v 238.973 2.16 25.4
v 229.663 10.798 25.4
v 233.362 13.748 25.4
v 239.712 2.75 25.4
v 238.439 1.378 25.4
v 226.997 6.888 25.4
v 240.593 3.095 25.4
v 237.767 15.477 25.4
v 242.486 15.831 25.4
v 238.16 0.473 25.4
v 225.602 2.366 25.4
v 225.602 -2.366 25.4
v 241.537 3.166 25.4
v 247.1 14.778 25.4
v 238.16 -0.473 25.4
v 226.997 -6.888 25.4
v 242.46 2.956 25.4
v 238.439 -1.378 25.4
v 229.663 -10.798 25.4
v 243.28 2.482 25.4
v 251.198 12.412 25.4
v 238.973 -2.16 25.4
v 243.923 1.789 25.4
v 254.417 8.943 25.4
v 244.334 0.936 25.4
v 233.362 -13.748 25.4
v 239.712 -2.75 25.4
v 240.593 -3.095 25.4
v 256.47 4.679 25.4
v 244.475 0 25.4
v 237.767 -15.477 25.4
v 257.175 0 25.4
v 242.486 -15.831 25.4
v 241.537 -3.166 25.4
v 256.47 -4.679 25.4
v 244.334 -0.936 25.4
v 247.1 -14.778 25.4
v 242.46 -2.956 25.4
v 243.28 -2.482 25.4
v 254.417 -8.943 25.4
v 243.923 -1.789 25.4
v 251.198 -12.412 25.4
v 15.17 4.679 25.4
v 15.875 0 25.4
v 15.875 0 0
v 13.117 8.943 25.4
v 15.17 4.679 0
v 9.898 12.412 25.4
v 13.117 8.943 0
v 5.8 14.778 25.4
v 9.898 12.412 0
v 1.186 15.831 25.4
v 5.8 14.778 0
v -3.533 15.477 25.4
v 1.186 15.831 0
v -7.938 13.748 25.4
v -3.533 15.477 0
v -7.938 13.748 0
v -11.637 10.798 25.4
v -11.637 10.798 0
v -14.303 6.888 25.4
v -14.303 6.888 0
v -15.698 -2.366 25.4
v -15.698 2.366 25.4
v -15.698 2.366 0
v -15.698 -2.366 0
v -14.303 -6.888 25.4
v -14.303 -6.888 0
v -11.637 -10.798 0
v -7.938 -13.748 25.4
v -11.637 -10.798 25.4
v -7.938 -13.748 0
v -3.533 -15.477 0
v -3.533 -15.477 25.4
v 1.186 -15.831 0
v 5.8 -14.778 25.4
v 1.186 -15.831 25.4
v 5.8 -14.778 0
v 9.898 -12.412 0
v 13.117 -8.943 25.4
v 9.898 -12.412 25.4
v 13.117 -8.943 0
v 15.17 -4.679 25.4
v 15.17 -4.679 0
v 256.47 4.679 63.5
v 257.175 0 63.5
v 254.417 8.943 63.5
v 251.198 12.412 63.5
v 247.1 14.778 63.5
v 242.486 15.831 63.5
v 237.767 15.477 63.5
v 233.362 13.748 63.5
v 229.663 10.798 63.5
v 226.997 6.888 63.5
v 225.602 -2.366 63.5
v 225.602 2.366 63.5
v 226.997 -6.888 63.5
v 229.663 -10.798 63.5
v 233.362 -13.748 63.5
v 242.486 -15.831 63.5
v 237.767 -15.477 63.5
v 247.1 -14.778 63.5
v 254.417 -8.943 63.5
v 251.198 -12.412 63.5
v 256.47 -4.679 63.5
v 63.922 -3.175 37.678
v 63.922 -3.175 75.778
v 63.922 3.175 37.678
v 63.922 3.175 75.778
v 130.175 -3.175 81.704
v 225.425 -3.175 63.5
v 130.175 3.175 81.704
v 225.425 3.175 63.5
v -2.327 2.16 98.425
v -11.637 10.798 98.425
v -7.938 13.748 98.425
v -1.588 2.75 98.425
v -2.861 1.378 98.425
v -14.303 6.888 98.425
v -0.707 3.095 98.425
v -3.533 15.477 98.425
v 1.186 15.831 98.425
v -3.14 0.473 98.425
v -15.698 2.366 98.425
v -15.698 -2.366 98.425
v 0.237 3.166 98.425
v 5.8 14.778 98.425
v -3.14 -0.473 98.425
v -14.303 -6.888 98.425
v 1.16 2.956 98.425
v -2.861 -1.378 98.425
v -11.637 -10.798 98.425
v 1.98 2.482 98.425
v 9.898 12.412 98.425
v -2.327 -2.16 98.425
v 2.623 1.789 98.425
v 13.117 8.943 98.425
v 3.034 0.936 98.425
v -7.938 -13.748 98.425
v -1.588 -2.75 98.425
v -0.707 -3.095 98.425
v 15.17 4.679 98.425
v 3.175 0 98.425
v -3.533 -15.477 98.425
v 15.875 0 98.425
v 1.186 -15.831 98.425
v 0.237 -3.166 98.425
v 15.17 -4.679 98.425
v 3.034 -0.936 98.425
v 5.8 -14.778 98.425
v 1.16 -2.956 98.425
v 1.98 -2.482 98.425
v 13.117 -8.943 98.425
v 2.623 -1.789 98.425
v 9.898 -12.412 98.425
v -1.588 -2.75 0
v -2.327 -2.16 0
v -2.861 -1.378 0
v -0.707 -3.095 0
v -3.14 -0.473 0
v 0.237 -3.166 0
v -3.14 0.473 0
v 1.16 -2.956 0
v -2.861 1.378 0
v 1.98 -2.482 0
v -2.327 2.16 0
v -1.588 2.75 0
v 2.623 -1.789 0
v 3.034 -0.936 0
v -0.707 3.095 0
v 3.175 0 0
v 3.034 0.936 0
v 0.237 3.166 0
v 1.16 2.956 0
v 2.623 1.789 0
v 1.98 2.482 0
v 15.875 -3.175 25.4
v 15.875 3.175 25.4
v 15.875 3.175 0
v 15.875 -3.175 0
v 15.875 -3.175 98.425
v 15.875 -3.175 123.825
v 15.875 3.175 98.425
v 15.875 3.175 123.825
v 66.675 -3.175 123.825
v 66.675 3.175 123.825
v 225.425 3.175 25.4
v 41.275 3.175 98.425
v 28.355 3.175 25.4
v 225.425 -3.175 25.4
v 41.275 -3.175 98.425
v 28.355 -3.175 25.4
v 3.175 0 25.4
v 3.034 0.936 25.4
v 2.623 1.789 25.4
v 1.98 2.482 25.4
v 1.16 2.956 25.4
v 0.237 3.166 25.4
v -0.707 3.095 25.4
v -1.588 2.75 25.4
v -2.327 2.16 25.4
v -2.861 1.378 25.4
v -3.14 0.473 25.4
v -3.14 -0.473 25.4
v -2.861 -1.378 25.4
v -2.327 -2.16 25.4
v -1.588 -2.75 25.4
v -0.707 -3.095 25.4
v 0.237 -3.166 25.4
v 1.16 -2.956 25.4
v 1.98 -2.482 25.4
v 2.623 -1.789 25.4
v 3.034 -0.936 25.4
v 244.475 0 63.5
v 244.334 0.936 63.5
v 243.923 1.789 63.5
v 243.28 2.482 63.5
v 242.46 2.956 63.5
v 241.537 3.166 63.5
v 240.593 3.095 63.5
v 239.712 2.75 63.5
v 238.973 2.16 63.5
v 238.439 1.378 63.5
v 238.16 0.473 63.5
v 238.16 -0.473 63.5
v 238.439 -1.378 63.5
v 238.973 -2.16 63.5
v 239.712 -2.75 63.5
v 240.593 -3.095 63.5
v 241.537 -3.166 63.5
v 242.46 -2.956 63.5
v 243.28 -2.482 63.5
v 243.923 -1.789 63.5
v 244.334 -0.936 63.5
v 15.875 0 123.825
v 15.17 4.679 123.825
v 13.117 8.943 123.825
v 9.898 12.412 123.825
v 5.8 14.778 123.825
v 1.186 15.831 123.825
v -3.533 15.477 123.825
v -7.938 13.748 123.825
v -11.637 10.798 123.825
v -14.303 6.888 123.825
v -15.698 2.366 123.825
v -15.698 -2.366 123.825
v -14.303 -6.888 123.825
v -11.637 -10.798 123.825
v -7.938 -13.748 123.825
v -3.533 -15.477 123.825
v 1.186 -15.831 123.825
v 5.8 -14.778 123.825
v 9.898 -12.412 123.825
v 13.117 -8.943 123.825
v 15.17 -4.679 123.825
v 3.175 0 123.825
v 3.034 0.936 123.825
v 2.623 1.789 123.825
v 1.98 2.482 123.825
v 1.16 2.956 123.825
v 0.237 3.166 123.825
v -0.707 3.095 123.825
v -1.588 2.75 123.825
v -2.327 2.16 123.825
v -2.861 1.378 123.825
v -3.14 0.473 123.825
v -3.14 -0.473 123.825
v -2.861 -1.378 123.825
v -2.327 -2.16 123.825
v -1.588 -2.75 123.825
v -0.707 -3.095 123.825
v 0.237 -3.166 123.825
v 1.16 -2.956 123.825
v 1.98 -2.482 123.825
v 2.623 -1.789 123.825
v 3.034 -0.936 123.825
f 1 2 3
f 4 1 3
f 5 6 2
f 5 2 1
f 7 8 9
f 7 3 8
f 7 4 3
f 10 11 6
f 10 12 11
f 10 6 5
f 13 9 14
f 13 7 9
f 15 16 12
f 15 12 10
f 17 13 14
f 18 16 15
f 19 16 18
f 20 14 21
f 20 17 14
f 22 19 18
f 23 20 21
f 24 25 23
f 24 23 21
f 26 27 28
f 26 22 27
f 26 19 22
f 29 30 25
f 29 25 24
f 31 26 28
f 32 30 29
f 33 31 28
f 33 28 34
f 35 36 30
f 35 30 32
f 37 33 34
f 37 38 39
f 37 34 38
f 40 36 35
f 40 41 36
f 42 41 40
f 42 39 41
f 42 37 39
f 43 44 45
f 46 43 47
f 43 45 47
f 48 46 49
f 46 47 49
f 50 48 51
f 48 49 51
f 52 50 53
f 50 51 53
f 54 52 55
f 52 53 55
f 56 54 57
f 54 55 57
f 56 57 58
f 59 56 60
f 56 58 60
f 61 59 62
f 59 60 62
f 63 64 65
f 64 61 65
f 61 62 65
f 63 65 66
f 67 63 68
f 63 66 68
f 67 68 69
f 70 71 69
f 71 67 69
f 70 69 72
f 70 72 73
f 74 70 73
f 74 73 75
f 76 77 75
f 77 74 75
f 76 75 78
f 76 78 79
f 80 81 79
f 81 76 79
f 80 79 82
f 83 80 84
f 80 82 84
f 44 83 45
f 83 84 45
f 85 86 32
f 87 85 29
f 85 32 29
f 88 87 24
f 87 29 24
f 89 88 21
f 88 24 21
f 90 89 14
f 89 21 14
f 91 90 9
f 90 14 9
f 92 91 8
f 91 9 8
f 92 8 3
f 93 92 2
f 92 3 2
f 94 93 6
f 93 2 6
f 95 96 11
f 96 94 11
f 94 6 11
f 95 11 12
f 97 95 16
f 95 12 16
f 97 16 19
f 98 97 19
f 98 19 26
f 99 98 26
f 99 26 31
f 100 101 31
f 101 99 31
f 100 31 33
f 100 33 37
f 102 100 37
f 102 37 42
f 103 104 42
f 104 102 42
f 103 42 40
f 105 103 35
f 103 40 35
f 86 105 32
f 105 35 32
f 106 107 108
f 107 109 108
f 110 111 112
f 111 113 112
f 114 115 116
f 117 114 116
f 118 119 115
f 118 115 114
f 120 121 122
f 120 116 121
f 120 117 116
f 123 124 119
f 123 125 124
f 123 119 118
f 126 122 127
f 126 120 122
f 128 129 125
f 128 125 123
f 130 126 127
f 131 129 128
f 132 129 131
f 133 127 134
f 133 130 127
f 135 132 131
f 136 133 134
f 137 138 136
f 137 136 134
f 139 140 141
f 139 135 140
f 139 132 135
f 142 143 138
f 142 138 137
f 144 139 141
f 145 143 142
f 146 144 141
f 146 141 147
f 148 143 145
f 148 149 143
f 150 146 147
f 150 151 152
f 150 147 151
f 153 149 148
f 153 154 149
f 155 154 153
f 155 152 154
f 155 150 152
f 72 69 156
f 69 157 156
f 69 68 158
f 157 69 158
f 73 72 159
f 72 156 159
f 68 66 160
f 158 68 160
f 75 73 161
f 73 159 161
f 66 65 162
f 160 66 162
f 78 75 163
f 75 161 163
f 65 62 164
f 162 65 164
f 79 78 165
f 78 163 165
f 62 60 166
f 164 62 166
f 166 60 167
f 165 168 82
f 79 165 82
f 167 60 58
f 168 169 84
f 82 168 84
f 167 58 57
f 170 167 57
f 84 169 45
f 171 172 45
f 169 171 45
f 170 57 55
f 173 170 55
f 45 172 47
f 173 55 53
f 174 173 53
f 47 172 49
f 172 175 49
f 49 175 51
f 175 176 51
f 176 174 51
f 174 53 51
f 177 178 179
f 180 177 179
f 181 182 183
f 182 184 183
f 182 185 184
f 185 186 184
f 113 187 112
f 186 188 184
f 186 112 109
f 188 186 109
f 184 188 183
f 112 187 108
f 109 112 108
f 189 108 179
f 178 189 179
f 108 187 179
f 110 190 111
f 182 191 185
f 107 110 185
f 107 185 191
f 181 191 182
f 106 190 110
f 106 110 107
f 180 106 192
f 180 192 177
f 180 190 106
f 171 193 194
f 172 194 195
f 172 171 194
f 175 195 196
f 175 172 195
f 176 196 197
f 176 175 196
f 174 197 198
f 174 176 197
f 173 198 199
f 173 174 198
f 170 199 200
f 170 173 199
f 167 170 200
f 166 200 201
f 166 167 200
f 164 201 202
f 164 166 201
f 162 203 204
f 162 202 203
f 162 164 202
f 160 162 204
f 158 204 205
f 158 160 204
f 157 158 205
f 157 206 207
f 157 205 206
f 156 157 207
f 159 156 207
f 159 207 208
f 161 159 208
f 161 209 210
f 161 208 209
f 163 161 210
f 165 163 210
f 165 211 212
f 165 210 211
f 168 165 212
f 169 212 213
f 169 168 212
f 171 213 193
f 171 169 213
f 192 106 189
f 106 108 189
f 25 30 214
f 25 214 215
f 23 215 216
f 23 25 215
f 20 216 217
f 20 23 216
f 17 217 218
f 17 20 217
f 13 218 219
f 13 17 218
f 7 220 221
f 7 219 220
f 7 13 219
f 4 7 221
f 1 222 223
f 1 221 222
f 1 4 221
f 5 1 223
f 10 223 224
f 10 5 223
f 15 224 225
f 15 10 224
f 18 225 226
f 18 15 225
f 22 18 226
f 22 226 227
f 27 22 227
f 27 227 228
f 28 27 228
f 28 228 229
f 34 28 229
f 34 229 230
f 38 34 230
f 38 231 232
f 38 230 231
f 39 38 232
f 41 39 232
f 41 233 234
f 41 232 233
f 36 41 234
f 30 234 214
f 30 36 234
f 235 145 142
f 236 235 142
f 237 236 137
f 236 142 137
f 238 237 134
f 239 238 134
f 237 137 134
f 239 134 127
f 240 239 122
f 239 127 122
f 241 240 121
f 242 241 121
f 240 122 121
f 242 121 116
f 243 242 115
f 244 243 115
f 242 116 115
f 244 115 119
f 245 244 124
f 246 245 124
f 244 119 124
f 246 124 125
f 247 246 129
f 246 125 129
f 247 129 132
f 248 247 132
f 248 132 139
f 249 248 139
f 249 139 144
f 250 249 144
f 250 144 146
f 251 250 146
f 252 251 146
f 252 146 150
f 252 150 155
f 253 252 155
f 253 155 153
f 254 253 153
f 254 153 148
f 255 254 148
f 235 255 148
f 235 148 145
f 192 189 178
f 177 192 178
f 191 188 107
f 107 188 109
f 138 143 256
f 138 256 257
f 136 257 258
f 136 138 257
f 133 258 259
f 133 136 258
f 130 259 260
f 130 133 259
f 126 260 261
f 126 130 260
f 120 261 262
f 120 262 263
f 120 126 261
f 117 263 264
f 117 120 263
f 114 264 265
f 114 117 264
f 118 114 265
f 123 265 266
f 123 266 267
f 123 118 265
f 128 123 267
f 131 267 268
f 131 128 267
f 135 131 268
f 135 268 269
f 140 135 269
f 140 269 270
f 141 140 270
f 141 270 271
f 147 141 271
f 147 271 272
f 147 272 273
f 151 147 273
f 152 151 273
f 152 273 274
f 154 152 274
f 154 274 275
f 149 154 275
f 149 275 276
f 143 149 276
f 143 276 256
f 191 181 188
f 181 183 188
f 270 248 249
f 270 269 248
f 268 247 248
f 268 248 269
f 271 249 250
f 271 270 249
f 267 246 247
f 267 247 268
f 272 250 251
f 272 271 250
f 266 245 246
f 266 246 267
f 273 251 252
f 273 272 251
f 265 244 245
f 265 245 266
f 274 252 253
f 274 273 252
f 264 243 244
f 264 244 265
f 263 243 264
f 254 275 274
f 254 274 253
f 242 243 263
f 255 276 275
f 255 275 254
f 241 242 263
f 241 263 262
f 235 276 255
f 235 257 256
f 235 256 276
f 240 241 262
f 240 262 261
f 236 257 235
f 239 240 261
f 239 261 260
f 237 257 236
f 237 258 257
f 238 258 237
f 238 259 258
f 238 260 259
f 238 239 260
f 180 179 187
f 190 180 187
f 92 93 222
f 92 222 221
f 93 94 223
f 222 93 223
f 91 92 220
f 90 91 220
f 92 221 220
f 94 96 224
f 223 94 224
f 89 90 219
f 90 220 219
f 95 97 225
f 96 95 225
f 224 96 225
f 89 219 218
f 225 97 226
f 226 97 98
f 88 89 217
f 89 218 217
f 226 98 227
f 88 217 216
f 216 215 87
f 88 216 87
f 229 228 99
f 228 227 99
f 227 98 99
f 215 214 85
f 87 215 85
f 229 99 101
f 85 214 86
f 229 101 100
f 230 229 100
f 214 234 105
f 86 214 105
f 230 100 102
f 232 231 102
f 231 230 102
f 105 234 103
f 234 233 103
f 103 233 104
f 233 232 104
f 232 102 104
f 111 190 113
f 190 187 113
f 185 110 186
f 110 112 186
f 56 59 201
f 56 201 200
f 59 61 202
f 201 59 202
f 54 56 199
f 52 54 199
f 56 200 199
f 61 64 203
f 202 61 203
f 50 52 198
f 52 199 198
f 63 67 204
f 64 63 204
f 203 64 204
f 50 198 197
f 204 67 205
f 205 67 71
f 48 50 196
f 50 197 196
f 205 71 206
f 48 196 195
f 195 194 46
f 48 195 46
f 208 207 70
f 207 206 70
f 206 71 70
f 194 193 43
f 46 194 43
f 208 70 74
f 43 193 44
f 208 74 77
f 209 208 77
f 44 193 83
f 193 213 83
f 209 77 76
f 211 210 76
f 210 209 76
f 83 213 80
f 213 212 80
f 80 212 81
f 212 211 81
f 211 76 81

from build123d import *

# Parameters (mm, degrees)
SKETCH1_R               = 15.875
SKETCH1_R_2             = 3.175
BOSS_EXTRUDE1_DEPTH     = 123.825
BOSS_EXTRUDE1_2_DEPTH   = 123.825
BOSS_EXTRUDE2_DEPTH     = 3.175
CUT_EXTRUDE1_DEPTH      = 286.873445558
CUT_EXTRUDE1_DEPTH_BACK = 286.873445558
SKETCH3_W               = 31.75
SKETCH3_H               = 73.025
SKETCH3_H_2             = 25.4
SKETCH3_H_3             = 60.325


with BuildPart() as part:
    # Sketch1 → Boss-Extrude1 (new body)
    with BuildSketch(Plane.XY):
        Circle(SKETCH1_R)
        Circle(SKETCH1_R_2, mode=Mode.SUBTRACT)
    extrude(amount=BOSS_EXTRUDE1_DEPTH)


with BuildPart() as body_2:
    # Sketch1 → Boss-Extrude1 2 (new body)
    with BuildSketch(Plane.XY):
        with Locations((241.3, 0)):
            Circle(SKETCH1_R)
        with Locations((241.3, 0)):
            Circle(SKETCH1_R_2, mode=Mode.SUBTRACT)
    extrude(amount=BOSS_EXTRUDE1_2_DEPTH)


with BuildPart() as body_3:
    # Sketch2 → Boss-Extrude2 (new, symmetric)
    with BuildSketch(Plane(origin=(0, 0, 0), x_dir=(1, 0, 0), z_dir=(0, 1, 0))):
        Polygon((15.875, 0), (225.425, -25.4), (225.425, -63.5), (130.175, -81.703865162), (66.675, -123.825), (15.875, -123.825), (15.875, -98.425), (41.275, -98.425), (63.921723228, -75.778276772), (63.921723228, -37.678276772), (28.355179528, -25.4), (15.875, -25.4), align=None)
    extrude(amount=BOSS_EXTRUDE2_DEPTH, both=True)


with BuildPart() as cut_extrude1_tool:
    # Sketch3 → Cut-Extrude1 (new, two sides: drawn at the far end of the back side and taken through both)
    with BuildSketch(Plane(origin=(0, 0, 0), x_dir=(1, 0, 0), z_dir=(0, 1, 0)).offset(-CUT_EXTRUDE1_DEPTH_BACK)):
        with Locations((0, -61.9125)):
            Rectangle(SKETCH3_W, SKETCH3_H)
        with Locations((241.3, -12.7)):
            Rectangle(SKETCH3_W, SKETCH3_H_2)
        with Locations((241.3, -93.6625)):
            Rectangle(SKETCH3_W, SKETCH3_H_3)
    extrude(amount=CUT_EXTRUDE1_DEPTH + CUT_EXTRUDE1_DEPTH_BACK)


with BuildPart() as part_1:
    add(part.part)

    # Cut-Extrude1: cut by cut_extrude1_tool
    add(cut_extrude1_tool.part, mode=Mode.SUBTRACT)


with BuildPart() as body_2_1:
    add(body_2.part)

    # Cut-Extrude1: cut by cut_extrude1_tool
    add(cut_extrude1_tool.part, mode=Mode.SUBTRACT)


solid = Compound([body_3.part, part_1.part, body_2_1.part])
